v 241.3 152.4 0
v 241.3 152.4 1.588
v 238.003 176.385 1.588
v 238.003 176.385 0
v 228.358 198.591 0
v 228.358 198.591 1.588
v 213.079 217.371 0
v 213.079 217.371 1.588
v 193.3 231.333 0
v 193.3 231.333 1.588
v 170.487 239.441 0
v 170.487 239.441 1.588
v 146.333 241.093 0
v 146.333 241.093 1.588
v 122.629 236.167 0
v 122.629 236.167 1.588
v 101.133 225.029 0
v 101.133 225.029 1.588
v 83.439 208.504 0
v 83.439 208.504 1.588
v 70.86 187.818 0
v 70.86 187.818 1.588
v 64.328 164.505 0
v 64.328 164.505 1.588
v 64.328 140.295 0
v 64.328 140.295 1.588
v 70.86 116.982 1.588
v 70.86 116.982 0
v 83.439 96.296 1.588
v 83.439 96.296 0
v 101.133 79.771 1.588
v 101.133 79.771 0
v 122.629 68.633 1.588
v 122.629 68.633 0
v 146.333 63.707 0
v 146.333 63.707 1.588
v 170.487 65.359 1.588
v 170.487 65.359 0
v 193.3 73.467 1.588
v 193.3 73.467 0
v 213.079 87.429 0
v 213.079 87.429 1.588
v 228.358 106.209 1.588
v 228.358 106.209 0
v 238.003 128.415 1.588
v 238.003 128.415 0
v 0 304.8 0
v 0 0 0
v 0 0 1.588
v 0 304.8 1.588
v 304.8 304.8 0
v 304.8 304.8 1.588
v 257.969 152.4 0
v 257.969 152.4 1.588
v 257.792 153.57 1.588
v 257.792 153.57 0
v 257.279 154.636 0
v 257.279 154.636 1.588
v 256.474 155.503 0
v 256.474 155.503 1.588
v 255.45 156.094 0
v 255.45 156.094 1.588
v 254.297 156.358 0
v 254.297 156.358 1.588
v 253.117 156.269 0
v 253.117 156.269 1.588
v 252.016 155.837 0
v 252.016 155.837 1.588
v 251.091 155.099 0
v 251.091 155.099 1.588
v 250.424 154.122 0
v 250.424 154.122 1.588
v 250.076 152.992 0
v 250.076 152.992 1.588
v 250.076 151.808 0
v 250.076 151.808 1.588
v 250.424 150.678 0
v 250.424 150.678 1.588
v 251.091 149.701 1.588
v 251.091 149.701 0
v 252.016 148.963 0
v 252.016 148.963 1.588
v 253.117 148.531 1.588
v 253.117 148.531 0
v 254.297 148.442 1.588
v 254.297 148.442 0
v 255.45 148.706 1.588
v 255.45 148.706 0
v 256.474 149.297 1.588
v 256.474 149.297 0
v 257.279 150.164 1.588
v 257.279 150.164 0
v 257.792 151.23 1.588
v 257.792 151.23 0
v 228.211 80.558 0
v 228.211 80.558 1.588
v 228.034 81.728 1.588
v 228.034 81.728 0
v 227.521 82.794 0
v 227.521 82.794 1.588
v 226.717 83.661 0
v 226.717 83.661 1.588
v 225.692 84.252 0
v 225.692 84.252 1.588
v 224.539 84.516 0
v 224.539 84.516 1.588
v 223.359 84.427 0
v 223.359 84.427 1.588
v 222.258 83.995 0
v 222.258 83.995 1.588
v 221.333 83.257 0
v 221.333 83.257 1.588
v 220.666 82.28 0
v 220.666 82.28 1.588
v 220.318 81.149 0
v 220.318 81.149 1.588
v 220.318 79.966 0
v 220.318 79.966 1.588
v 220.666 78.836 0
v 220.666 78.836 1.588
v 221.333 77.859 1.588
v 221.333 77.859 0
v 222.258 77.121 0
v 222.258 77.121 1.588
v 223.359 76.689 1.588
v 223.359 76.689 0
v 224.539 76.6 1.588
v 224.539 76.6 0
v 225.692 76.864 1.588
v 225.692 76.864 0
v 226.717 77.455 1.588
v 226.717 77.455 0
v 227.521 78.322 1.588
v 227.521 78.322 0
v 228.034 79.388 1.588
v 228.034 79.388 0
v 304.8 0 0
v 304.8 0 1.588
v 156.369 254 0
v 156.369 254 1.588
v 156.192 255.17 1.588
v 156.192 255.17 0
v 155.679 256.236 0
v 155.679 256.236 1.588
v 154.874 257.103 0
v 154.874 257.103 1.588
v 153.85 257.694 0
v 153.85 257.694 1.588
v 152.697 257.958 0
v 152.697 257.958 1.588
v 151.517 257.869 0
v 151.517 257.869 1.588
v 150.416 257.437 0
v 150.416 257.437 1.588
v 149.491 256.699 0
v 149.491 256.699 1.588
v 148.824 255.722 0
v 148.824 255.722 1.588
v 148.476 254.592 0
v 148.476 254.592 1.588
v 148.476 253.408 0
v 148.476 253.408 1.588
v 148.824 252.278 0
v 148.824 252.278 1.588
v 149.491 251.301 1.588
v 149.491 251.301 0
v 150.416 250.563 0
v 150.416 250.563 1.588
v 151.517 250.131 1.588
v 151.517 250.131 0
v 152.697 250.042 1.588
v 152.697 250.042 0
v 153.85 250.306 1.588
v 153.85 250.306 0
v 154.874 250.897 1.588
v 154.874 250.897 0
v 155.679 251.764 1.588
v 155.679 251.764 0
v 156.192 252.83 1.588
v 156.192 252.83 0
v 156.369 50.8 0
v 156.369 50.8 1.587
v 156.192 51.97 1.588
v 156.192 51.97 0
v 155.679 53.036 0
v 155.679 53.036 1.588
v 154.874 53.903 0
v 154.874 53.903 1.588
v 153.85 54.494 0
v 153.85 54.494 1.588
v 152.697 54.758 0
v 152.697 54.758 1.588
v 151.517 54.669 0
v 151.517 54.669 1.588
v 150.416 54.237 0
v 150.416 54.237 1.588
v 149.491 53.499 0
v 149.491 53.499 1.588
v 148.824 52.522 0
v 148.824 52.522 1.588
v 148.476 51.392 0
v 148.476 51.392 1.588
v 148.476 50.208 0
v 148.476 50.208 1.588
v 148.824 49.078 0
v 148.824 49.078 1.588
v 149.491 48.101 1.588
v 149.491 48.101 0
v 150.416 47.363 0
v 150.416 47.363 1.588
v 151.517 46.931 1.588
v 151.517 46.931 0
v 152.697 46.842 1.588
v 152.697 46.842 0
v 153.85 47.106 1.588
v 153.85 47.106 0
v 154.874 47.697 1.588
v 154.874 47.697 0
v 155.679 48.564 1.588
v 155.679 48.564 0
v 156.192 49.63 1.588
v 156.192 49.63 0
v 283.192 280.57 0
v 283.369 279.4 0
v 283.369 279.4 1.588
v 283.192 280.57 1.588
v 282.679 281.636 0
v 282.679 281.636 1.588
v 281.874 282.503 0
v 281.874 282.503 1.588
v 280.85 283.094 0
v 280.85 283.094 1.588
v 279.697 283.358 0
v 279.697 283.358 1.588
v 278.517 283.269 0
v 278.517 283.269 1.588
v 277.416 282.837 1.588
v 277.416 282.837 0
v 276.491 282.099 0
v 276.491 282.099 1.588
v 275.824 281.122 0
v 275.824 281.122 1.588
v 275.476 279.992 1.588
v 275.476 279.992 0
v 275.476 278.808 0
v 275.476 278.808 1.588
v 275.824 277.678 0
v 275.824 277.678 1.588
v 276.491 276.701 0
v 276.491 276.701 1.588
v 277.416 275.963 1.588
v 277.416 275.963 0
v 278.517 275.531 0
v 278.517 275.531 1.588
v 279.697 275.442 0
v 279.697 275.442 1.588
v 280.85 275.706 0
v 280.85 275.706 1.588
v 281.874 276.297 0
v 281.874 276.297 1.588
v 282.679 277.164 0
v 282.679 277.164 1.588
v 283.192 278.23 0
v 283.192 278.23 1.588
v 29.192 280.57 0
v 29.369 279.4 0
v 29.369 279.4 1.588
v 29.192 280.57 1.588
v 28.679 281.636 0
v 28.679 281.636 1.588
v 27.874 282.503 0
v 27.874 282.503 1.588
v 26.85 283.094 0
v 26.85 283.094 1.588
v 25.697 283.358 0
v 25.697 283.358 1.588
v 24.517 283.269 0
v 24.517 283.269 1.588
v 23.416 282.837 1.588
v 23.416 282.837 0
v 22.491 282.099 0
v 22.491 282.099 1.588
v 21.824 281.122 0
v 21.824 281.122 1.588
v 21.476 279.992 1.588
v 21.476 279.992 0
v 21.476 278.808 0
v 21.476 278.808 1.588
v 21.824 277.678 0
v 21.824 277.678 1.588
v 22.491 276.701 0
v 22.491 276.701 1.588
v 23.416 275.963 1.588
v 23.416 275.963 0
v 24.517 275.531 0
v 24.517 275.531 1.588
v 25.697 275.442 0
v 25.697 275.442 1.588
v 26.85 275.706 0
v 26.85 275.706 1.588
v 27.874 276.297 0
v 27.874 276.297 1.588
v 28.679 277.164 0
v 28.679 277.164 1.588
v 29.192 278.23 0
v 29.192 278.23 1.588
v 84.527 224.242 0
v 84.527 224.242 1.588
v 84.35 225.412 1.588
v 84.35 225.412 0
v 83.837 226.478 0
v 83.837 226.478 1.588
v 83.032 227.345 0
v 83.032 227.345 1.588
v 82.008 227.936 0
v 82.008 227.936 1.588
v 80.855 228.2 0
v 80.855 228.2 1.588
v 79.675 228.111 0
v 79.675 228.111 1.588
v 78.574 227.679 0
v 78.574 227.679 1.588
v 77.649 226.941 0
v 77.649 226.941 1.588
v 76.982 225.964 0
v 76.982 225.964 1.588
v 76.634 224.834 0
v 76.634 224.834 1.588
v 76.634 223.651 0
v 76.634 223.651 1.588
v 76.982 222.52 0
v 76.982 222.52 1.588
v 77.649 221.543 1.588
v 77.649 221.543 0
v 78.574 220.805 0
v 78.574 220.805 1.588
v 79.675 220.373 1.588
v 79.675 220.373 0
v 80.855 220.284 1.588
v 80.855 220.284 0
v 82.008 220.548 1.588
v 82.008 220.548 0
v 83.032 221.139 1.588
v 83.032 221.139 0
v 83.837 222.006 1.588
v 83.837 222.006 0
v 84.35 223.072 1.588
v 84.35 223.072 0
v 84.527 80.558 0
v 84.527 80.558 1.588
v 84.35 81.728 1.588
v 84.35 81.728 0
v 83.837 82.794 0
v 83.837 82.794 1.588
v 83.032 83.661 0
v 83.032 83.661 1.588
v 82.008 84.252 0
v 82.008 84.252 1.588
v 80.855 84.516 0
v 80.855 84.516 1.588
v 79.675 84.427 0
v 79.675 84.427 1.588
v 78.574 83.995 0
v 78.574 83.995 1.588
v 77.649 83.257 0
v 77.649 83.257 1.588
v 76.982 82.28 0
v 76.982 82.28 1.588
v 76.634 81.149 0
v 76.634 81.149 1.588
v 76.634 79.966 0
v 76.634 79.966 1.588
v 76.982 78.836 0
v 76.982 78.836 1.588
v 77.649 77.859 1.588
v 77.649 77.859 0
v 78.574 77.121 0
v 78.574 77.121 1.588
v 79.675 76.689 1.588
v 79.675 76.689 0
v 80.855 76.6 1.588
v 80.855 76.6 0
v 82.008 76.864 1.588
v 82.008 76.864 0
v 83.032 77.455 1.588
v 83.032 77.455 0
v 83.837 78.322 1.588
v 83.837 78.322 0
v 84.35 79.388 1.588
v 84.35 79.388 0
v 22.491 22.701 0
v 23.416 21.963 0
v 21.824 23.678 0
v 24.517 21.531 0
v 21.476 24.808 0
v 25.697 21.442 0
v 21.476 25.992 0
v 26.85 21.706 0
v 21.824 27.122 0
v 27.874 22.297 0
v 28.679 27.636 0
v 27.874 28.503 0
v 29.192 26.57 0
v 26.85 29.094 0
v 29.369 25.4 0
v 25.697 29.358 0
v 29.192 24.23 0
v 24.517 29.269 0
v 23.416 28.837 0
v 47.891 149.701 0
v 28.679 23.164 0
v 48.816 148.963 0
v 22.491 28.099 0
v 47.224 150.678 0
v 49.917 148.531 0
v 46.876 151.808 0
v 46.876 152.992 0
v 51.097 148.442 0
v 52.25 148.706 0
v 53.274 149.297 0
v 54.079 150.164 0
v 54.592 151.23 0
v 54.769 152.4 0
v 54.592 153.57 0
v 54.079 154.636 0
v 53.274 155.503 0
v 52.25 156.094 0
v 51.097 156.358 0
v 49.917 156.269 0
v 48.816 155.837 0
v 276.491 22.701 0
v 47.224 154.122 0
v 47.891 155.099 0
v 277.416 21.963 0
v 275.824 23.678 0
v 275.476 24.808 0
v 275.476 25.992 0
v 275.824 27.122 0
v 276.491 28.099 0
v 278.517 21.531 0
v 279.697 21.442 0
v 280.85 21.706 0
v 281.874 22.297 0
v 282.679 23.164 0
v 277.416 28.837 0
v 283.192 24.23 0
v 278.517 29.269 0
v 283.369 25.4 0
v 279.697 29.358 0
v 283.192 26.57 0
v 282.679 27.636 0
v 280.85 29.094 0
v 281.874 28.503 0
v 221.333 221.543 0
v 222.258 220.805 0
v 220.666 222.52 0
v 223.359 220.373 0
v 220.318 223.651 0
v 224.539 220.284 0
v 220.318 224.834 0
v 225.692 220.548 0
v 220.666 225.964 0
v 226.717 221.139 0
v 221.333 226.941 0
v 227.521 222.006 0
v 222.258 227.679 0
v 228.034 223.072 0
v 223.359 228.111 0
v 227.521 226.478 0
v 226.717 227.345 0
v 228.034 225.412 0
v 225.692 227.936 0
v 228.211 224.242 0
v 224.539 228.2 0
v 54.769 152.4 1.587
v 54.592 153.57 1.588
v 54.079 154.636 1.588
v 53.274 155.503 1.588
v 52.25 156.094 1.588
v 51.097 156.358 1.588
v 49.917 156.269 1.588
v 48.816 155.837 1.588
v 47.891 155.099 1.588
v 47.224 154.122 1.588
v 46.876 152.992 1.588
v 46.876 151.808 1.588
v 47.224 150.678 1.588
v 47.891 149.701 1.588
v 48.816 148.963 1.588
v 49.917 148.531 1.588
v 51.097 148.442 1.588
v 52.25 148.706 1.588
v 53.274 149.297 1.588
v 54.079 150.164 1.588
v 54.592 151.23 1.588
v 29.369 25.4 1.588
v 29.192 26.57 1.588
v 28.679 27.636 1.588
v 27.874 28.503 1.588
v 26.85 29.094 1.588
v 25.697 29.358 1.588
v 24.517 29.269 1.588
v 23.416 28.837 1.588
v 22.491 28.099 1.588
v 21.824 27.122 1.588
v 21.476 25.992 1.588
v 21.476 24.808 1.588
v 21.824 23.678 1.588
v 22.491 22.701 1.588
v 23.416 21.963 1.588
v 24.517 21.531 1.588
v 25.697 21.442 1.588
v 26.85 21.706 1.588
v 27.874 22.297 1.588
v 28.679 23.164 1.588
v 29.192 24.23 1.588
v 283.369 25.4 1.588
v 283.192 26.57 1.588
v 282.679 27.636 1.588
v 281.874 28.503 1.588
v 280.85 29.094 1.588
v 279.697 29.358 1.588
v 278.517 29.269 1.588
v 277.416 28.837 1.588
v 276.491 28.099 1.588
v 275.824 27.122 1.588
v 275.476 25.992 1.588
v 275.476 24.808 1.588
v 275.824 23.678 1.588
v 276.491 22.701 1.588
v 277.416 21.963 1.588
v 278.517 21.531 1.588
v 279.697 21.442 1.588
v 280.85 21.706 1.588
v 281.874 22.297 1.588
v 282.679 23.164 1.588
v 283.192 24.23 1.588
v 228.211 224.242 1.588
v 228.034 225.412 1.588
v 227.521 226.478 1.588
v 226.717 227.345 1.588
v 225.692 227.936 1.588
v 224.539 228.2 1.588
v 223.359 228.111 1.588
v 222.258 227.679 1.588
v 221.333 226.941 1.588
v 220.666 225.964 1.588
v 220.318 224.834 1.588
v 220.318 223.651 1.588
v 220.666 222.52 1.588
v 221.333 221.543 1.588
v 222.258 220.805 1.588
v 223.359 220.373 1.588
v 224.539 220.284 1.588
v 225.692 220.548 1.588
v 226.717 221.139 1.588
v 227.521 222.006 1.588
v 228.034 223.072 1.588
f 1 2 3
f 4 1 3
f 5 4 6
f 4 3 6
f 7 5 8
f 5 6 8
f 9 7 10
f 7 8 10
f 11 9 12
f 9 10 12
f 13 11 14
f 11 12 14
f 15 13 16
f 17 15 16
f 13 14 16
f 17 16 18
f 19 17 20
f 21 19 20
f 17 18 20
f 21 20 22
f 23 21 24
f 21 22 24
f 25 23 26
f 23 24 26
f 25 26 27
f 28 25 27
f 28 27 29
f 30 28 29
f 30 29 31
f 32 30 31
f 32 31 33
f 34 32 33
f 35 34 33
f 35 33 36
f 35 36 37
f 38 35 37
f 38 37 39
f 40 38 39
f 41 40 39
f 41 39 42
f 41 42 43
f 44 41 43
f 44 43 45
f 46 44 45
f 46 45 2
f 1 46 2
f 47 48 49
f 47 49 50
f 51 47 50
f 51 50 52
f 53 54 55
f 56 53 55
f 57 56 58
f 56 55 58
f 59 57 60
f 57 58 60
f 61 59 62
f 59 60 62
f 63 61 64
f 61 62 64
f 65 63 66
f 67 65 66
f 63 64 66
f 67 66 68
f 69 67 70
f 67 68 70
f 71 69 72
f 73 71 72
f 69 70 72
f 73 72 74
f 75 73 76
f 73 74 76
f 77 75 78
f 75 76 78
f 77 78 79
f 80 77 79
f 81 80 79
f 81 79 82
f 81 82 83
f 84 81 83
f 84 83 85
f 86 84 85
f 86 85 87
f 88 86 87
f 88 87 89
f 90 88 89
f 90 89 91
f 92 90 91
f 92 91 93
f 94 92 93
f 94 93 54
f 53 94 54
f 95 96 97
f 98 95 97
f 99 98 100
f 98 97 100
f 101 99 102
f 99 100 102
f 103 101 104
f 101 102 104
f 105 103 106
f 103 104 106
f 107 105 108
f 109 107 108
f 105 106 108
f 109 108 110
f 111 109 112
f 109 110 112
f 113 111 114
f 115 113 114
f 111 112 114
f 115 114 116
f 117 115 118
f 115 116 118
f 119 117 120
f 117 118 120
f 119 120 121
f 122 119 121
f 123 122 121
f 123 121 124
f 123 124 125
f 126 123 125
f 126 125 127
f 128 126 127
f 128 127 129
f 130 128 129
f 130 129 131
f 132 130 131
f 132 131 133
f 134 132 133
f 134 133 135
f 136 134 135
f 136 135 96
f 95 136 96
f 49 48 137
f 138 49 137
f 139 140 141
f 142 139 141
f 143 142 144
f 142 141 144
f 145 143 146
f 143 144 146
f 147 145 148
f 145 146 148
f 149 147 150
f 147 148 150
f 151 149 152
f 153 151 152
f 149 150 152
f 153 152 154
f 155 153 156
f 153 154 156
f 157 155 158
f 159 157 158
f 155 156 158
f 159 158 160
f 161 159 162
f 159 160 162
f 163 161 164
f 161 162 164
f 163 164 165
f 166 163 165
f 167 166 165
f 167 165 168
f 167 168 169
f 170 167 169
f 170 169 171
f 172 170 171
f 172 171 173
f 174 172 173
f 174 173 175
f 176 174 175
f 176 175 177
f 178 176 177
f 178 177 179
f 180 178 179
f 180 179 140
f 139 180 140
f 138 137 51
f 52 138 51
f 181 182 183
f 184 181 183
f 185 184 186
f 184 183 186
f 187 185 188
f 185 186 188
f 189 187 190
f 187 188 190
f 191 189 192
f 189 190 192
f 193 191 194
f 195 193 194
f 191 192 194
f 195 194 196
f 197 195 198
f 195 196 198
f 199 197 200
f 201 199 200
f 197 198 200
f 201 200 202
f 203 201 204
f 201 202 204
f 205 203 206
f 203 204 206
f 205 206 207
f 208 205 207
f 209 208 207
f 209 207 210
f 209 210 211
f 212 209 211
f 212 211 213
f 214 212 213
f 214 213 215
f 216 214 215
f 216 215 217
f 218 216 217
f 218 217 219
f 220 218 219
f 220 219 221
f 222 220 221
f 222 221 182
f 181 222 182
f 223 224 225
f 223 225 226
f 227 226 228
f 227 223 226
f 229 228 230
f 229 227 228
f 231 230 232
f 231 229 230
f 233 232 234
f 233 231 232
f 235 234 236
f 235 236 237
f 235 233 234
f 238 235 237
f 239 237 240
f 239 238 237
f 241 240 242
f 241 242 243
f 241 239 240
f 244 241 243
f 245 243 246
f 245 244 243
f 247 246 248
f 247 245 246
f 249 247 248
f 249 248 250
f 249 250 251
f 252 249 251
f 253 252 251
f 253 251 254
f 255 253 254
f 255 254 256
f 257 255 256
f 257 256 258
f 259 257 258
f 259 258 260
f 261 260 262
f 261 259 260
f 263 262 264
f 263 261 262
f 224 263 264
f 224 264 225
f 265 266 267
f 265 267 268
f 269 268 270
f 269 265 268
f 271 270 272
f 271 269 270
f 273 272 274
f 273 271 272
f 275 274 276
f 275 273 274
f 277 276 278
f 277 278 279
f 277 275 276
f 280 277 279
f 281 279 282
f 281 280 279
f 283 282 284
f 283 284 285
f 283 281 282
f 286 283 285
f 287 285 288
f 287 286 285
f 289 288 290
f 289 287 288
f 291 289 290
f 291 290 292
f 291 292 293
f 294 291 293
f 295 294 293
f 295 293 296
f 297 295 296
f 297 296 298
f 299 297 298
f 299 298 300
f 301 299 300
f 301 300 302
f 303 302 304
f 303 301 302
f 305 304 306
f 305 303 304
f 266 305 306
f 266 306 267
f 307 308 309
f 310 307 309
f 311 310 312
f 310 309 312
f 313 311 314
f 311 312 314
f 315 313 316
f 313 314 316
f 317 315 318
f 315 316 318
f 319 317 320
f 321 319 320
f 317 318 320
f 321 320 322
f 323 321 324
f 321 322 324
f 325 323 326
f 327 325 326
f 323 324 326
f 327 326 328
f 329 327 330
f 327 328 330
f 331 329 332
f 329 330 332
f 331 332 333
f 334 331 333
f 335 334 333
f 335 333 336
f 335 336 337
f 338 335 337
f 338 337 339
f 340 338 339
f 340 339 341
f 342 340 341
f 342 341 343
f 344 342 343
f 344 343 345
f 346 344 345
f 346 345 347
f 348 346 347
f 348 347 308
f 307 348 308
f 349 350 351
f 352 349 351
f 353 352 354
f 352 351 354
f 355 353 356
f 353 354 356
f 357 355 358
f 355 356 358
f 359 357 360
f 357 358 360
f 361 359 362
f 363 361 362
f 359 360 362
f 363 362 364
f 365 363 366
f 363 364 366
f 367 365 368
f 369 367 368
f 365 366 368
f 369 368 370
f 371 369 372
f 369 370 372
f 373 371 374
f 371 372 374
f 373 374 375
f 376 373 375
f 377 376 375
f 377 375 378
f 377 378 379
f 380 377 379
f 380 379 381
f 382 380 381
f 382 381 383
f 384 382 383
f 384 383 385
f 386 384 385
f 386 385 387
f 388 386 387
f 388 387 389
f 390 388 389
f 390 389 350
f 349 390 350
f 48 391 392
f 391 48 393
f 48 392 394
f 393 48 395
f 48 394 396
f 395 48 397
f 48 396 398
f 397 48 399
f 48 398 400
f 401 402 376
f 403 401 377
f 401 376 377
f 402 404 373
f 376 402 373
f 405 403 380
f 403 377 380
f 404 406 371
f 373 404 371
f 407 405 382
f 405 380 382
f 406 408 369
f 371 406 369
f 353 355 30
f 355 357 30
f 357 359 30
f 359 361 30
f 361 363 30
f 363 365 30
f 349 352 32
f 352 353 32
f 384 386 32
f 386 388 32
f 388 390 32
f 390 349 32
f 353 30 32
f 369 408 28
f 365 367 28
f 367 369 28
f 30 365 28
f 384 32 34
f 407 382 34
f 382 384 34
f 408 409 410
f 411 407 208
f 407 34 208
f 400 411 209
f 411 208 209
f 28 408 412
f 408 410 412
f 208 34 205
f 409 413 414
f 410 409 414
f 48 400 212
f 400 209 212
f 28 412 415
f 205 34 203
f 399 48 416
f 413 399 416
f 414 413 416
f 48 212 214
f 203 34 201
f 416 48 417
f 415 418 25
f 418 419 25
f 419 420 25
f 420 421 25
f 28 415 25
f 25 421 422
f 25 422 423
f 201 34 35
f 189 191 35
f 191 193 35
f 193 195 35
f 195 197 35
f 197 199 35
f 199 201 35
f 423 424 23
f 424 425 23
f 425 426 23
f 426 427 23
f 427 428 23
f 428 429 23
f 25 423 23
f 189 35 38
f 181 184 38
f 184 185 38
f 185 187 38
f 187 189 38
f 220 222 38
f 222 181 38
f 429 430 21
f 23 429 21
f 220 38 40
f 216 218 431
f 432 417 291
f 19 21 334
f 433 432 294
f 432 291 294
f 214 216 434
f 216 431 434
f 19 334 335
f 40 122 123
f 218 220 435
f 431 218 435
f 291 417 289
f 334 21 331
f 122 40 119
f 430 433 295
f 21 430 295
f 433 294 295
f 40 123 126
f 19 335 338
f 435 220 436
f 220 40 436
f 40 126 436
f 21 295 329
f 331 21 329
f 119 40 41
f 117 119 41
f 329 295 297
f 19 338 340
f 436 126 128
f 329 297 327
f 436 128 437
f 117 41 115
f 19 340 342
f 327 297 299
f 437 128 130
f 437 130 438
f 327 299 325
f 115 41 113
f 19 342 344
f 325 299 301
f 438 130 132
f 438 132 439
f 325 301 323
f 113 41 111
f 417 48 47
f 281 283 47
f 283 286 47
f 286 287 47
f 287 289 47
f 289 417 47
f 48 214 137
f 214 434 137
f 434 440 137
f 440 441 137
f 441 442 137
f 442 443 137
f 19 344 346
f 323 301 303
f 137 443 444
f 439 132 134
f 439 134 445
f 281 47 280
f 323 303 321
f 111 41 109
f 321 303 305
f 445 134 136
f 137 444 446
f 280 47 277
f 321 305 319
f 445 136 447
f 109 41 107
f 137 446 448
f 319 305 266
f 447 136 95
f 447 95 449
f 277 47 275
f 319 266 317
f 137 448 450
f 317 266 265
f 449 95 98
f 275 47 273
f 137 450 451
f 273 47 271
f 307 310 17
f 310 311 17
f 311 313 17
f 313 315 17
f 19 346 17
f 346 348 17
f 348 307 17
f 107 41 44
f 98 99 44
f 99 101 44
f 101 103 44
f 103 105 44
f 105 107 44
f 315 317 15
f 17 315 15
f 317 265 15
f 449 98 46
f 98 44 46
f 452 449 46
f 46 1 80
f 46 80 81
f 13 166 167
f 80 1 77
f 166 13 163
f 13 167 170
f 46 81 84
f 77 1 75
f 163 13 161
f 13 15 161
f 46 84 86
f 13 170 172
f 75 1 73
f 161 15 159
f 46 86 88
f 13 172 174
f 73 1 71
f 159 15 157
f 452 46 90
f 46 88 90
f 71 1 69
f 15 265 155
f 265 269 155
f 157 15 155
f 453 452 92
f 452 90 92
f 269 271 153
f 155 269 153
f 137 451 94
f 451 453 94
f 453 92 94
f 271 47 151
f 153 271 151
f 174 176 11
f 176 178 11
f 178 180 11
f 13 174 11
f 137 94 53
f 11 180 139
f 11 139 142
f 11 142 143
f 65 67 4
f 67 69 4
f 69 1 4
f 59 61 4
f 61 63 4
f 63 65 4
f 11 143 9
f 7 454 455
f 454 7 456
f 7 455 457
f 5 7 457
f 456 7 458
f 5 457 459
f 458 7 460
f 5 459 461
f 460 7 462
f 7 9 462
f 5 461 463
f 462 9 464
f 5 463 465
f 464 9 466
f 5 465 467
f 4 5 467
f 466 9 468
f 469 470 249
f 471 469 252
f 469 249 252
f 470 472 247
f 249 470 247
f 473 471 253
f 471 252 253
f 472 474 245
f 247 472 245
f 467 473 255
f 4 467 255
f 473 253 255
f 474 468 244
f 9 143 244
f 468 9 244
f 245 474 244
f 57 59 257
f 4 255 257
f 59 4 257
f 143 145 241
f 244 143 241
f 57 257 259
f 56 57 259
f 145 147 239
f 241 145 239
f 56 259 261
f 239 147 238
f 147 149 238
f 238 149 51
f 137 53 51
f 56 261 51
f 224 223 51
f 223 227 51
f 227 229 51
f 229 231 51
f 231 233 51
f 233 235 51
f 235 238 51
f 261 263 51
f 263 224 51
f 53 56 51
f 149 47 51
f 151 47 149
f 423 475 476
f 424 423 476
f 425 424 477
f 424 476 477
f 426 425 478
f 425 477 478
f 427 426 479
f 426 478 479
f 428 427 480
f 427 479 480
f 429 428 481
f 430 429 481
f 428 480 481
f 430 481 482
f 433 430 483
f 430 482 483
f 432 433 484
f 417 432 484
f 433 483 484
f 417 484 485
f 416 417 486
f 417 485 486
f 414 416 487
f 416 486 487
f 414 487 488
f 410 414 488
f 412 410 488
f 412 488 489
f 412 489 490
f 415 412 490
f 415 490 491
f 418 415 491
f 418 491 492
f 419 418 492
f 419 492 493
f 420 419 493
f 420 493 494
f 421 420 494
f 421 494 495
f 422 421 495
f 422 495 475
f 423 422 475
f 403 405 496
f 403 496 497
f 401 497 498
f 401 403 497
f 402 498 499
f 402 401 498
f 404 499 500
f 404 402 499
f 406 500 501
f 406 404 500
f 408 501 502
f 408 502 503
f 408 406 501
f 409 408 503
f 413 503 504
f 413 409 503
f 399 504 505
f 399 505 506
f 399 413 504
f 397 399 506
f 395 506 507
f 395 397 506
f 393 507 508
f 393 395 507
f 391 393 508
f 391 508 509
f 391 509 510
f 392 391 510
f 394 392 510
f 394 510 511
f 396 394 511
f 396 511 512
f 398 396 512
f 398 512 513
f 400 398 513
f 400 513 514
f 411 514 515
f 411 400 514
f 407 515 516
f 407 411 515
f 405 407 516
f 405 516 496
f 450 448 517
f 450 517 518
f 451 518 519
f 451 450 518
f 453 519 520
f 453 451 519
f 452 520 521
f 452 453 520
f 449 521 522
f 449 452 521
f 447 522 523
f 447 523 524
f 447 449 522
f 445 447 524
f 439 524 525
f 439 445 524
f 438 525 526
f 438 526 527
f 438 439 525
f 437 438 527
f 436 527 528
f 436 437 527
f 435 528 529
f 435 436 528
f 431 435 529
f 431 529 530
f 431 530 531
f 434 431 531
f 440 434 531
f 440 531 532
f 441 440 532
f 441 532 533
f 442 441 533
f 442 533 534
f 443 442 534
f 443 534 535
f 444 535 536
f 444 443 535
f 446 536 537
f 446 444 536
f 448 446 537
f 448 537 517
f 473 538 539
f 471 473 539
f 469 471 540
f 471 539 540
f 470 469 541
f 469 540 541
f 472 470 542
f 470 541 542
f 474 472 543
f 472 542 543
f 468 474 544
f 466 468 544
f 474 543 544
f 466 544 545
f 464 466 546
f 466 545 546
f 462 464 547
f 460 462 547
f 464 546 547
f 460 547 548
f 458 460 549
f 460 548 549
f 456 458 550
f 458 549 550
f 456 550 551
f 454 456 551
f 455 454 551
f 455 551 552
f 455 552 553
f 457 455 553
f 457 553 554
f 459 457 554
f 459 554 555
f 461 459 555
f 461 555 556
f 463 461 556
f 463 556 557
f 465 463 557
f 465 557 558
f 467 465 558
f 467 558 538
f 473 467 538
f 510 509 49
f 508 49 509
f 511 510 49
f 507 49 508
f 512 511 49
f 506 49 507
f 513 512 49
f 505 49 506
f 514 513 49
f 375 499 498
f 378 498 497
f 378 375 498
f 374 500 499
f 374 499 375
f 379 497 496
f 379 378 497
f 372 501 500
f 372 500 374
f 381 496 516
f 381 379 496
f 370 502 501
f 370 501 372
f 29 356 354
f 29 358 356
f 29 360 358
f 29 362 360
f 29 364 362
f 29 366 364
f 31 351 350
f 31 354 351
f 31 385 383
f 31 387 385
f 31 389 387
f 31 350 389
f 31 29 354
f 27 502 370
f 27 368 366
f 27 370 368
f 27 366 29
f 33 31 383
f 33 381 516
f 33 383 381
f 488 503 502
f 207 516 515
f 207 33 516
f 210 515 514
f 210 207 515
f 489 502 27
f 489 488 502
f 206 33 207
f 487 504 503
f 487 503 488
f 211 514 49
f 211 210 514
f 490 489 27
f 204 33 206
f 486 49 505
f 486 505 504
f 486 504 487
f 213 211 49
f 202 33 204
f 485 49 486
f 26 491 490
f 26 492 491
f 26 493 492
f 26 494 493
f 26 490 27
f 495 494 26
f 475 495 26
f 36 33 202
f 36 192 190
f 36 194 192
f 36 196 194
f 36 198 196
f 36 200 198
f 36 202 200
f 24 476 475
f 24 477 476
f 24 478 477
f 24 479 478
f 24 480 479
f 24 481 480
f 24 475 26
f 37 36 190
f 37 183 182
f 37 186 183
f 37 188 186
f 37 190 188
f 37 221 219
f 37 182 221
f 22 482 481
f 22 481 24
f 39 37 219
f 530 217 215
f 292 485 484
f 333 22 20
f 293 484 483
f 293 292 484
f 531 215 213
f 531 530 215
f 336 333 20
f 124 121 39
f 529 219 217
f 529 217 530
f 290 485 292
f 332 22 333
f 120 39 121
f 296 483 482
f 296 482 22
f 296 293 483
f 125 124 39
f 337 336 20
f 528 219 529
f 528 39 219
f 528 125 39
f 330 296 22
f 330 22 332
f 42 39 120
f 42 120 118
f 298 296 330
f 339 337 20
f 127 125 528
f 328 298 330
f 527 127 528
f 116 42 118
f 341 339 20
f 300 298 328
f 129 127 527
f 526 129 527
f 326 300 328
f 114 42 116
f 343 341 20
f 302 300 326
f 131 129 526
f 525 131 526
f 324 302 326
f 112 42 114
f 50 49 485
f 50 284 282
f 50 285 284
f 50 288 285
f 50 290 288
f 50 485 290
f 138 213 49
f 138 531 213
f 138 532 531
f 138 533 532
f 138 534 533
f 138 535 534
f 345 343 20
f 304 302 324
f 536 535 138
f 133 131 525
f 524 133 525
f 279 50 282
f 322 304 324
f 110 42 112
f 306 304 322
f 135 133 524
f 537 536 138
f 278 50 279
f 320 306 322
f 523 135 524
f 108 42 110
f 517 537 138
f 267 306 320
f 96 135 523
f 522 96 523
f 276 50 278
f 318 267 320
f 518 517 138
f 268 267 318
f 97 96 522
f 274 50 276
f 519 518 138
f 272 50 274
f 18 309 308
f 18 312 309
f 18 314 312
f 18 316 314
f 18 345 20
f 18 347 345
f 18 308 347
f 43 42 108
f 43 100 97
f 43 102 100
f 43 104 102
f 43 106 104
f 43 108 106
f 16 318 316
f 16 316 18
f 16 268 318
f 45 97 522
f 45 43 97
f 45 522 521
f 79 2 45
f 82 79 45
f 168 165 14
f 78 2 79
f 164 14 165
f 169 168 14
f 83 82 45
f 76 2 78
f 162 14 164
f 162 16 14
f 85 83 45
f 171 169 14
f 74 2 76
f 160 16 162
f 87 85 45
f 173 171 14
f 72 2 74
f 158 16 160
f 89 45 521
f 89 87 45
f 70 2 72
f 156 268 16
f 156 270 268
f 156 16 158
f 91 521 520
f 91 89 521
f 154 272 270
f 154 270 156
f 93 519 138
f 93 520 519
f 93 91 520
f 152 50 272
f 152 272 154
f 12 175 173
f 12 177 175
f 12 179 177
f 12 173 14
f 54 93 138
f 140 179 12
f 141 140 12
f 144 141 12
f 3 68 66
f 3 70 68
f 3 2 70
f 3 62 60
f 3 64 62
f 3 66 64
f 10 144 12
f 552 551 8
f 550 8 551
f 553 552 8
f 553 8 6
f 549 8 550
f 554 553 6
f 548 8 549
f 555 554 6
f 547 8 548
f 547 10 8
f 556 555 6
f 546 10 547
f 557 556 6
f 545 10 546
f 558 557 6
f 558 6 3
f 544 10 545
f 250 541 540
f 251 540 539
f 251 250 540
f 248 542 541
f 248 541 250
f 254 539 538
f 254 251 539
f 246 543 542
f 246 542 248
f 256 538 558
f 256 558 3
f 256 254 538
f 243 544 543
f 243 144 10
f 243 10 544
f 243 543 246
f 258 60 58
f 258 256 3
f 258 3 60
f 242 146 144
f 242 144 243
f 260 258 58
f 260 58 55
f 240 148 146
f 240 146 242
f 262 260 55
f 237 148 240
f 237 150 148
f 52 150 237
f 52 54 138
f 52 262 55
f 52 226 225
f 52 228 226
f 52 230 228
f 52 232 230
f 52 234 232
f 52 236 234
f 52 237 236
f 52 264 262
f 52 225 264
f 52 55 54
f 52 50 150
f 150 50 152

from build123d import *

# Parameters (mm, degrees)
F0_W     = 304.8
F0_H     = 304.8
F0_R     = 3.96875
F1_DEPTH = 1.5875
F2_R     = 88.9
F3_DEPTH = 25.4
F4_R     = 3.96875
F5_DEPTH = 25.4
F6_DEPTH = 25.4


with BuildPart() as f1:
    # F0 (on Top) → F1 (new body)
    with BuildSketch(Plane.XY):
        with Locations((152.4, 152.4)):
            Rectangle(F0_W, F0_H)
        with Locations((25.4, 25.4)):
            Circle(F0_R, mode=Mode.SUBTRACT)
        with Locations((279.4, 25.4)):
            Circle(F0_R, mode=Mode.SUBTRACT)
        with Locations((25.4, 279.4)):
            Circle(F0_R, mode=Mode.SUBTRACT)
        with Locations((279.4, 279.4)):
            Circle(F0_R, mode=Mode.SUBTRACT)
    extrude(amount=F1_DEPTH)

    # F2 (on face) → F3 (cut)
    with BuildSketch(Plane.XY.offset(1.5875)):
        with Locations((152.4, 152.4)):
            Circle(F2_R)
    extrude(amount=-F3_DEPTH, mode=Mode.SUBTRACT)

    # F4 (on face) → F5 (cut)
    with BuildSketch(Plane.XY.offset(1.5875)):
        with Locations((152.4, 254)):
            Circle(F4_R)
        with Locations((152.4, 50.8)):
            Circle(F4_R)
        with Locations((50.8, 152.4)):
            Circle(F4_R)
        with Locations((254, 152.4)):
            Circle(F4_R)
        with Locations((80.557951, 224.242049)):
            Circle(F4_R)
        with Locations((224.242049, 80.557951)):
            Circle(F4_R)
        with Locations((224.242049, 224.242049)):
            Circle(F4_R)
        with Locations((80.557951, 80.557951)):
            Circle(F4_R)
    extrude(amount=-F5_DEPTH, mode=Mode.SUBTRACT)

    # F4 (on face) → F6 (cut)
    with BuildSketch(Plane.XY.offset(1.5875)):
        with Locations((152.4, 254)):
            Circle(F4_R)
        with Locations((152.4, 50.8)):
            Circle(F4_R)
        with Locations((50.8, 152.4)):
            Circle(F4_R)
        with Locations((254, 152.4)):
            Circle(F4_R)
        with Locations((80.557951, 224.242049)):
            Circle(F4_R)
        with Locations((224.242049, 80.557951)):
            Circle(F4_R)
        with Locations((224.242049, 224.242049)):
            Circle(F4_R)
        with Locations((80.557951, 80.557951)):
            Circle(F4_R)
    extrude(amount=-F6_DEPTH, mode=Mode.SUBTRACT)


solid = f1.part
